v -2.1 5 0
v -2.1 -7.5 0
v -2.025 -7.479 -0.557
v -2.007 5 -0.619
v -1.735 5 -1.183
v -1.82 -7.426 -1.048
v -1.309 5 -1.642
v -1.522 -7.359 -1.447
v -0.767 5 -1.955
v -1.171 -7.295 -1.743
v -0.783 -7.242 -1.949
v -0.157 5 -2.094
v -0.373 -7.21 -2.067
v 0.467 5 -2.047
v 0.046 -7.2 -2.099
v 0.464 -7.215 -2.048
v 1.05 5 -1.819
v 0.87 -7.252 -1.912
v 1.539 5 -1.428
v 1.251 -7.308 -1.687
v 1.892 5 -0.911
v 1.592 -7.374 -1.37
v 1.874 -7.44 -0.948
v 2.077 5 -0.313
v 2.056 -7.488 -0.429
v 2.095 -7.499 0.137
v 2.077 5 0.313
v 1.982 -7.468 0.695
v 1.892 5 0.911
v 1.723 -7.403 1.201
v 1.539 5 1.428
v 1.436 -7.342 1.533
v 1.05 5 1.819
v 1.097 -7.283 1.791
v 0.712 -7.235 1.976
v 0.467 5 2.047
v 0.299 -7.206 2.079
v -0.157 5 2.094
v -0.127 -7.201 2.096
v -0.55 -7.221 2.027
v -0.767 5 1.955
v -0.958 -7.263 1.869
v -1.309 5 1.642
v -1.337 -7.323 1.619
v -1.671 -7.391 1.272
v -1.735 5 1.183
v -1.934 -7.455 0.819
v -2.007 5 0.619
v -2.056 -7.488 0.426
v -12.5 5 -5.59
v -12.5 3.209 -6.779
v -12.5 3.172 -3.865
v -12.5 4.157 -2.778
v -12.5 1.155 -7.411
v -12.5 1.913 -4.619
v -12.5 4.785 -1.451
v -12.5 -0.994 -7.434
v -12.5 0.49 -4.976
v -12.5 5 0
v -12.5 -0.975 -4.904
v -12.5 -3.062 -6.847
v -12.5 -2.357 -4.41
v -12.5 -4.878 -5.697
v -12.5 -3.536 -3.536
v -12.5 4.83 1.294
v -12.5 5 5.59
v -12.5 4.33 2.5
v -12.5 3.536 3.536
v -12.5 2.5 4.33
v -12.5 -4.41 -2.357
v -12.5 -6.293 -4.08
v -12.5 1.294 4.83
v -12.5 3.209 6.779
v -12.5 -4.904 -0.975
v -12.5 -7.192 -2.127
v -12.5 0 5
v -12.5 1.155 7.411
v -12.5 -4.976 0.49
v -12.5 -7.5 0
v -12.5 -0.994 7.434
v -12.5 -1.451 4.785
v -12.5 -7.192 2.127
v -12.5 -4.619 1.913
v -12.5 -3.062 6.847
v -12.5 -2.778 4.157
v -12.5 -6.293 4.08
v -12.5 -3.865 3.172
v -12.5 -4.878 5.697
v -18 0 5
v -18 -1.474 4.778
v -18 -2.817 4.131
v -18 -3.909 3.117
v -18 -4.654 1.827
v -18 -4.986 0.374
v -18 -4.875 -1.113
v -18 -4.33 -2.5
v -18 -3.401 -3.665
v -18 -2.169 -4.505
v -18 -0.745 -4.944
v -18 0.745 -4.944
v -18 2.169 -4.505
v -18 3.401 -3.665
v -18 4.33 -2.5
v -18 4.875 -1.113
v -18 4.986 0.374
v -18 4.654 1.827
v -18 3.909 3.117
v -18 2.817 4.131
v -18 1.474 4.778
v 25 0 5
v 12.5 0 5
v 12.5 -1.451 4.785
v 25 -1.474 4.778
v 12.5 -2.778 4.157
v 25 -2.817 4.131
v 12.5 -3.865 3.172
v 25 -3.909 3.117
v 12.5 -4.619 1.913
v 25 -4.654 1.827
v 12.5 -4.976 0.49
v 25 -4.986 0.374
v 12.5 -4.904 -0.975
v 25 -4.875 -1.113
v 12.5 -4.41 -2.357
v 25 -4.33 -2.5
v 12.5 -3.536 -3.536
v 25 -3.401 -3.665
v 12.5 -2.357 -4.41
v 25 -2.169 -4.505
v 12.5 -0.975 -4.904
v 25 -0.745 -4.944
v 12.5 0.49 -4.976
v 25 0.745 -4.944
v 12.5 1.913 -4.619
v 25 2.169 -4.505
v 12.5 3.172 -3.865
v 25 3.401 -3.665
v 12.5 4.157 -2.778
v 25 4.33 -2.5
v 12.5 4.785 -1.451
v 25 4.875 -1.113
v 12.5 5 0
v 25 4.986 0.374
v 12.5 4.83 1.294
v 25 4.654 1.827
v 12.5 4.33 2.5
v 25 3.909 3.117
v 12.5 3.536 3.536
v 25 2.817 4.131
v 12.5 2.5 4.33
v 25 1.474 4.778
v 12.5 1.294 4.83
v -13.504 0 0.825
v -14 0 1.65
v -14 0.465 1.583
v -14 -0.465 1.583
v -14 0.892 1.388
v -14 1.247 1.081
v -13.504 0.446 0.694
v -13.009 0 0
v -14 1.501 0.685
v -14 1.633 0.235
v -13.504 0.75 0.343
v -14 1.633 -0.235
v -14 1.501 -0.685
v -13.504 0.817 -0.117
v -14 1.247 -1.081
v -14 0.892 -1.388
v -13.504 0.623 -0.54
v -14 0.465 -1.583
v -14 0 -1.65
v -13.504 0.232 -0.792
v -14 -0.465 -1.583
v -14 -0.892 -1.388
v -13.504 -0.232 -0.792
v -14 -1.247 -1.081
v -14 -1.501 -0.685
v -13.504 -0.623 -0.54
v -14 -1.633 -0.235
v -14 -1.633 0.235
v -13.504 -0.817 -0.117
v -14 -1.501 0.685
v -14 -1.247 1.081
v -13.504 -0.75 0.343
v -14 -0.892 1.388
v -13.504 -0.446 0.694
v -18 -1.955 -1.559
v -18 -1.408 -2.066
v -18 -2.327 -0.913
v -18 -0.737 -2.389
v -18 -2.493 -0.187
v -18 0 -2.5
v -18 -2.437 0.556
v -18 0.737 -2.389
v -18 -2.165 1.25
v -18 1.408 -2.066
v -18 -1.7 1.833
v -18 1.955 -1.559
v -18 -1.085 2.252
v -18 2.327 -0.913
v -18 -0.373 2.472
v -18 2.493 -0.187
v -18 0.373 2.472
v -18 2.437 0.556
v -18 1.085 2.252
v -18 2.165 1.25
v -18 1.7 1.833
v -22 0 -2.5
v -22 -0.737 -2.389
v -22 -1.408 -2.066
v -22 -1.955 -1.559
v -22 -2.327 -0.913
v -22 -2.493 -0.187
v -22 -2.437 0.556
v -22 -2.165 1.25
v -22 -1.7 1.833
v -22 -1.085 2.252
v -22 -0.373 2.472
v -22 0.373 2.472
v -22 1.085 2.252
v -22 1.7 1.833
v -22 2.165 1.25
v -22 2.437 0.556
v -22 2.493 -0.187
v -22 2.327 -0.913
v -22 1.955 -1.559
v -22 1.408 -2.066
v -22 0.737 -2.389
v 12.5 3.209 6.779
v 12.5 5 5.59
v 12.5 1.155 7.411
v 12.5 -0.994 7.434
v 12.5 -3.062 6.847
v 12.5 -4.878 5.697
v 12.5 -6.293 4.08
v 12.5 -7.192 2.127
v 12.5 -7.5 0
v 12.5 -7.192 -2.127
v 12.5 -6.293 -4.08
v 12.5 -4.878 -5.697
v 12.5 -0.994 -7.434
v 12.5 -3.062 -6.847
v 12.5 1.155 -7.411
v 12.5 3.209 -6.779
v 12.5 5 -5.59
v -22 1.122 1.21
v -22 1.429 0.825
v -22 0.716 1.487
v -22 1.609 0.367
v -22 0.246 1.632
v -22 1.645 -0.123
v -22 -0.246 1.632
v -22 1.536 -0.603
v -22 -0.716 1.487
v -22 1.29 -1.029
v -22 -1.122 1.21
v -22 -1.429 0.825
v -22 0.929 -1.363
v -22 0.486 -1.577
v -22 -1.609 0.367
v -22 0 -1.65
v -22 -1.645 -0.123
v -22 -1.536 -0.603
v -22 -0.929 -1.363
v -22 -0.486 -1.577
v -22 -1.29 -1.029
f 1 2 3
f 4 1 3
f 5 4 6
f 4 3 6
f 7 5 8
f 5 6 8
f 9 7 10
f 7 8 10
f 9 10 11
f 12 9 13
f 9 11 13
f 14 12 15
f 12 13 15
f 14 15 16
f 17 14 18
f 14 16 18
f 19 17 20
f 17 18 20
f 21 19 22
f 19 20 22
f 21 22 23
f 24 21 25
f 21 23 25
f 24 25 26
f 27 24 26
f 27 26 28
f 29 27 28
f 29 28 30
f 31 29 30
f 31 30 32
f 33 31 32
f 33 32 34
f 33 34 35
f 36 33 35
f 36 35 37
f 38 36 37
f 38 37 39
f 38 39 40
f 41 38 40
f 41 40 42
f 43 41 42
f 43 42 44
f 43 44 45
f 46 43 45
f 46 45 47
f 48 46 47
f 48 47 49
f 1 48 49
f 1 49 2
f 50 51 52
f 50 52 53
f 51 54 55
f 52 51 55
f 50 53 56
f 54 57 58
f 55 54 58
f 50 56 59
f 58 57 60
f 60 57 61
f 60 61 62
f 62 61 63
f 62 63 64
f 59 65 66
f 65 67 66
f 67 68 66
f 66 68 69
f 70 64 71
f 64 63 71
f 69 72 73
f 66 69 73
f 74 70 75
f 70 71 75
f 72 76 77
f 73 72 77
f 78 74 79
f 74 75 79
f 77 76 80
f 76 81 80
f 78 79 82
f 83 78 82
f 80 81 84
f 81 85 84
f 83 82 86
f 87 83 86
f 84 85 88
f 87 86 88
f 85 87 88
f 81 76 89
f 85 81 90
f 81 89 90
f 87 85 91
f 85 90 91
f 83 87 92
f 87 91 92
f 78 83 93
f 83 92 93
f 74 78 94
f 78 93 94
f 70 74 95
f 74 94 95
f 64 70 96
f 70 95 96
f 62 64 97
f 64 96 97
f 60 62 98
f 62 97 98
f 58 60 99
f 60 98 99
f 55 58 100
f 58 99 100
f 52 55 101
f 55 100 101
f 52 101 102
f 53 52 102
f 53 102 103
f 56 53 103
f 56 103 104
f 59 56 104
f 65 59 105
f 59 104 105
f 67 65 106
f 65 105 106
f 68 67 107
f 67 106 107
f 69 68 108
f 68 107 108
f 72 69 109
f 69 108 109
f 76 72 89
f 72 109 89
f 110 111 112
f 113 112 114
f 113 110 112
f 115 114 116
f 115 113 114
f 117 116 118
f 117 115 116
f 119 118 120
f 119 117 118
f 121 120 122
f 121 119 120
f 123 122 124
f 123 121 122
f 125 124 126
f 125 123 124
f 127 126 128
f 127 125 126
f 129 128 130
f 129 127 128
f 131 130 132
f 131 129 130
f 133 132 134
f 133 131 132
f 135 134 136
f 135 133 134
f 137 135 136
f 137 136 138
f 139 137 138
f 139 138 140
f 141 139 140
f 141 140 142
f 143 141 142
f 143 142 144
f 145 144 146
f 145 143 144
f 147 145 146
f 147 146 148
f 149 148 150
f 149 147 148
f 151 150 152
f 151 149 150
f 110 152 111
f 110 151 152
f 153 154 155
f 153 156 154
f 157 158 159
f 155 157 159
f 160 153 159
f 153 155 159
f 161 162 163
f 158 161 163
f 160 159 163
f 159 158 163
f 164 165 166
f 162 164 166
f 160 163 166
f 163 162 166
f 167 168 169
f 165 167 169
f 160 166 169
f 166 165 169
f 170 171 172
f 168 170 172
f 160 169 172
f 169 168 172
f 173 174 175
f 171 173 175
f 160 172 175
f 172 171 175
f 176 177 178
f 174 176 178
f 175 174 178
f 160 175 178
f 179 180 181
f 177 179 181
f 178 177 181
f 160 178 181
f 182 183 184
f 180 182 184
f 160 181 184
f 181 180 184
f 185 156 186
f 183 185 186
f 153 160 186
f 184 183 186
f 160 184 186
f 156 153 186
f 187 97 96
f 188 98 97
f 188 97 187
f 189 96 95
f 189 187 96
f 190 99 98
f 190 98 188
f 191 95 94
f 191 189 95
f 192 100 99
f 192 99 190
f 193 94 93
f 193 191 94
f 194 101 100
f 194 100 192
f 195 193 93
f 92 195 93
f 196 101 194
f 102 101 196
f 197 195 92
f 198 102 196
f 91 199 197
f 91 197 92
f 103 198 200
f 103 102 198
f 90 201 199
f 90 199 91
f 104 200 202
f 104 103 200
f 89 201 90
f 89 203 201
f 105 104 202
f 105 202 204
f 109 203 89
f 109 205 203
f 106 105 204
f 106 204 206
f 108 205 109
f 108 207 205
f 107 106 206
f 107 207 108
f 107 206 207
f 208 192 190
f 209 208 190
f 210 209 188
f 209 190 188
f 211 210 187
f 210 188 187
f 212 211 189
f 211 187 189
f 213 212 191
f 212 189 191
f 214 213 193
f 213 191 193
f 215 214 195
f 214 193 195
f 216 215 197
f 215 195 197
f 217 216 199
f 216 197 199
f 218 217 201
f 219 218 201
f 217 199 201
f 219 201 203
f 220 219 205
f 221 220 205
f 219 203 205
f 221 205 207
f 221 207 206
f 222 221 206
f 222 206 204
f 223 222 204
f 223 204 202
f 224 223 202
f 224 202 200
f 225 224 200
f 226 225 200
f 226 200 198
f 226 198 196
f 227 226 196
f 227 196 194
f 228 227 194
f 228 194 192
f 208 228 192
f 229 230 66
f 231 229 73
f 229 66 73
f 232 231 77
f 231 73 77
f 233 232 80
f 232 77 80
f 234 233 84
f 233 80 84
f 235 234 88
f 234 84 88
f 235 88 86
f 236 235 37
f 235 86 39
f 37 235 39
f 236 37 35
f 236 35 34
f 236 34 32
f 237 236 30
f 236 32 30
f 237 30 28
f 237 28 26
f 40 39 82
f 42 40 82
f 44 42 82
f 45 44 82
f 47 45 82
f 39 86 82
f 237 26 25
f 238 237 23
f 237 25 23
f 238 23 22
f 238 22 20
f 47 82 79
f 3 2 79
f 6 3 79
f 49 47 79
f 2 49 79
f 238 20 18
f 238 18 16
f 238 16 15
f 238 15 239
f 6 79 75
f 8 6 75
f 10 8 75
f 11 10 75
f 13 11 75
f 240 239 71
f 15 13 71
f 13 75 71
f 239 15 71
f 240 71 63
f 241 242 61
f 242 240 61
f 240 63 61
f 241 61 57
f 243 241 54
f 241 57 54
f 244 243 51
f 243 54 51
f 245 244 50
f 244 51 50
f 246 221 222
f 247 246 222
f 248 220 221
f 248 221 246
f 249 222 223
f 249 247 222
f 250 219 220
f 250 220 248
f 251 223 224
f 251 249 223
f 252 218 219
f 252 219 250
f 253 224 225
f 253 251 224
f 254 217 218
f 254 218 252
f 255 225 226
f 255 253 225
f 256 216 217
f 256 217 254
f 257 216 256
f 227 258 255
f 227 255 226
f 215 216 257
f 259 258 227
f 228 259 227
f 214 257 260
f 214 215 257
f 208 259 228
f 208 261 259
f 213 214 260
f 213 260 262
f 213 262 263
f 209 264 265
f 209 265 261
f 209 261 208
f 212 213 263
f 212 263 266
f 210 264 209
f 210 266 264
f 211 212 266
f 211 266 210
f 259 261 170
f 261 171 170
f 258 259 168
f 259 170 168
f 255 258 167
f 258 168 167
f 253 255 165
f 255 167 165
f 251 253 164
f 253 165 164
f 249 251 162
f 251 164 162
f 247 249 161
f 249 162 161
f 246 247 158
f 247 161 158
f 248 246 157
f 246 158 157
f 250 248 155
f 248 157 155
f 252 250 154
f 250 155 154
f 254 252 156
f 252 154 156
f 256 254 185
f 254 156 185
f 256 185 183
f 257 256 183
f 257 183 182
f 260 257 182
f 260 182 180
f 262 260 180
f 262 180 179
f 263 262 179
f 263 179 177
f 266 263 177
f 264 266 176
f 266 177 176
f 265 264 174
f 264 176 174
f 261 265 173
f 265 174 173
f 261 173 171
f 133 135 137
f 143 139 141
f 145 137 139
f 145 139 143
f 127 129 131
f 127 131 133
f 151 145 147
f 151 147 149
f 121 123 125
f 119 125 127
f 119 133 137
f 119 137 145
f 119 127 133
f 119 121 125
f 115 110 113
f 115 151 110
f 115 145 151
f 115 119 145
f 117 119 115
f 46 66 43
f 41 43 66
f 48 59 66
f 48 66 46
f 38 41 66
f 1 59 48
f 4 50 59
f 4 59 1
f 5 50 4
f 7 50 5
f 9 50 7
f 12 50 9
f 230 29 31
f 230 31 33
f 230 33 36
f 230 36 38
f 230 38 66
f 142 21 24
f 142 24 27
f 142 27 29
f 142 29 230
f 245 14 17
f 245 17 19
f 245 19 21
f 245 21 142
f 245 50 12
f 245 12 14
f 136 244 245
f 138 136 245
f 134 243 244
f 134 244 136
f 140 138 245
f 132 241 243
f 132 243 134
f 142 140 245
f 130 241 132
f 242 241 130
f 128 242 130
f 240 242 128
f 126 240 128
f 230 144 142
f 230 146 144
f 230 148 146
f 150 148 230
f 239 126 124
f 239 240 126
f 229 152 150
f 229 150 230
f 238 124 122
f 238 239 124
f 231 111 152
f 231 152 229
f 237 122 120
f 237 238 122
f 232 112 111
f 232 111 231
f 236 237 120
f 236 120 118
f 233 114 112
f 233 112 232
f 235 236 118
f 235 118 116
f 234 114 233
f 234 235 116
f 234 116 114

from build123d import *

# Parameters (mm, degrees)
CUT_EXTRUDE_START        = 5
SKETCH_2_W               = 25
SKETCH_2_H               = 23.22226429
CUT_EXTRUDE_1_DEPTH      = 23.156951228
HOLE_WIZARD_M5_1_D       = 4.2
CUT_EXTRUDE_2_DEPTH      = 52.11262078
CUT_EXTRUDE_2_DEPTH_BACK = 7
SKETCH_6_OUTSIDE_W       = 27.736
SKETCH_6_OUTSIDE_H       = 25.236
SKETCH_6_OUTSIDE_R       = 2.5
CUT_EXTRUDE_START_2      = -3
SKETCH_7_R               = 2.5
CUT_EXTRUDE_3_DEPTH      = 3
HOLE_WIZARD_M4_1_D       = 3.3
HOLE_WIZARD_M4_1_DEPTH   = 8
HOLE_WIZARD_M4_1_TIP     = 0.991420021


with BuildPart() as part:
    # 草图1 → 旋转1 (revolve)
    with BuildSketch(Plane.XY, mode=Mode.PRIVATE) as revolve_1_sk:
        Polygon((0, 7.5), (12.5, 7.5), (12.5, 5), (25, 5), (25, 0), (0, 0), align=None)
    revolve_1 = revolve(revolve_1_sk.sketch.rotate(Axis((0, 0, 0), (1, 0, 0)), 90), axis=Axis((0, 0, 0), (1, 0, 0)))

    # 镜向1: 旋转1 across plane
    add(revolve_1.mirror(Plane(origin=(0, 0, 0), x_dir=(0, 0, 1), z_dir=(1, 0, 0))))

    # 草图2 → 切除-拉伸1 (cut, through all)
    with BuildSketch(Plane(origin=(0, 0, 0), x_dir=(1, 0, 0), z_dir=(0, 1, 0)).offset(CUT_EXTRUDE_START)):
        Rectangle(SKETCH_2_W, SKETCH_2_H)
    extrude(amount=CUT_EXTRUDE_1_DEPTH, mode=Mode.SUBTRACT)

    # M5 螺纹孔的螺纹孔钻头1 (through all)
    with Locations(Plane(origin=(0, 5, 0), x_dir=(1, 0, 0), z_dir=(0, 1, 0))):
        with Locations((0, 0)):
            Hole(HOLE_WIZARD_M5_1_D / 2)

    # 草图6 outside → 切除-拉伸2 (cut, two sides: drawn at the far end of the back side and taken through both)
    with BuildSketch(Plane.ZY.offset(25).offset(-CUT_EXTRUDE_2_DEPTH_BACK)):
        with Locations((0, -1.25)):
            Rectangle(SKETCH_6_OUTSIDE_W, SKETCH_6_OUTSIDE_H)
        with Locations(Location((0, 0, 0), (0, 0, 180))):
            Circle(SKETCH_6_OUTSIDE_R, mode=Mode.SUBTRACT)
    extrude(amount=CUT_EXTRUDE_2_DEPTH + CUT_EXTRUDE_2_DEPTH_BACK, mode=Mode.SUBTRACT)

    # 草图7 → 切除-拉伸3 (cut)
    with BuildSketch(Plane.ZY.offset(25).offset(CUT_EXTRUDE_START_2)):
        with Locations(Location((0, 0, 0), (0, 0, 180))):
            Circle(SKETCH_7_R)
    extrude(amount=CUT_EXTRUDE_3_DEPTH, mode=Mode.SUBTRACT)

    # M4 螺纹孔的螺纹孔钻头1
    with Locations(Plane.ZY.offset(22)):
        with Locations((0, 0)):
            Hole(HOLE_WIZARD_M4_1_D / 2, depth=HOLE_WIZARD_M4_1_DEPTH)
            with Locations((0, 0, -(HOLE_WIZARD_M4_1_DEPTH + HOLE_WIZARD_M4_1_TIP / 2))):  # 118° drill point
                Cone(0, HOLE_WIZARD_M4_1_D / 2, HOLE_WIZARD_M4_1_TIP, mode=Mode.SUBTRACT)


solid = part.part
